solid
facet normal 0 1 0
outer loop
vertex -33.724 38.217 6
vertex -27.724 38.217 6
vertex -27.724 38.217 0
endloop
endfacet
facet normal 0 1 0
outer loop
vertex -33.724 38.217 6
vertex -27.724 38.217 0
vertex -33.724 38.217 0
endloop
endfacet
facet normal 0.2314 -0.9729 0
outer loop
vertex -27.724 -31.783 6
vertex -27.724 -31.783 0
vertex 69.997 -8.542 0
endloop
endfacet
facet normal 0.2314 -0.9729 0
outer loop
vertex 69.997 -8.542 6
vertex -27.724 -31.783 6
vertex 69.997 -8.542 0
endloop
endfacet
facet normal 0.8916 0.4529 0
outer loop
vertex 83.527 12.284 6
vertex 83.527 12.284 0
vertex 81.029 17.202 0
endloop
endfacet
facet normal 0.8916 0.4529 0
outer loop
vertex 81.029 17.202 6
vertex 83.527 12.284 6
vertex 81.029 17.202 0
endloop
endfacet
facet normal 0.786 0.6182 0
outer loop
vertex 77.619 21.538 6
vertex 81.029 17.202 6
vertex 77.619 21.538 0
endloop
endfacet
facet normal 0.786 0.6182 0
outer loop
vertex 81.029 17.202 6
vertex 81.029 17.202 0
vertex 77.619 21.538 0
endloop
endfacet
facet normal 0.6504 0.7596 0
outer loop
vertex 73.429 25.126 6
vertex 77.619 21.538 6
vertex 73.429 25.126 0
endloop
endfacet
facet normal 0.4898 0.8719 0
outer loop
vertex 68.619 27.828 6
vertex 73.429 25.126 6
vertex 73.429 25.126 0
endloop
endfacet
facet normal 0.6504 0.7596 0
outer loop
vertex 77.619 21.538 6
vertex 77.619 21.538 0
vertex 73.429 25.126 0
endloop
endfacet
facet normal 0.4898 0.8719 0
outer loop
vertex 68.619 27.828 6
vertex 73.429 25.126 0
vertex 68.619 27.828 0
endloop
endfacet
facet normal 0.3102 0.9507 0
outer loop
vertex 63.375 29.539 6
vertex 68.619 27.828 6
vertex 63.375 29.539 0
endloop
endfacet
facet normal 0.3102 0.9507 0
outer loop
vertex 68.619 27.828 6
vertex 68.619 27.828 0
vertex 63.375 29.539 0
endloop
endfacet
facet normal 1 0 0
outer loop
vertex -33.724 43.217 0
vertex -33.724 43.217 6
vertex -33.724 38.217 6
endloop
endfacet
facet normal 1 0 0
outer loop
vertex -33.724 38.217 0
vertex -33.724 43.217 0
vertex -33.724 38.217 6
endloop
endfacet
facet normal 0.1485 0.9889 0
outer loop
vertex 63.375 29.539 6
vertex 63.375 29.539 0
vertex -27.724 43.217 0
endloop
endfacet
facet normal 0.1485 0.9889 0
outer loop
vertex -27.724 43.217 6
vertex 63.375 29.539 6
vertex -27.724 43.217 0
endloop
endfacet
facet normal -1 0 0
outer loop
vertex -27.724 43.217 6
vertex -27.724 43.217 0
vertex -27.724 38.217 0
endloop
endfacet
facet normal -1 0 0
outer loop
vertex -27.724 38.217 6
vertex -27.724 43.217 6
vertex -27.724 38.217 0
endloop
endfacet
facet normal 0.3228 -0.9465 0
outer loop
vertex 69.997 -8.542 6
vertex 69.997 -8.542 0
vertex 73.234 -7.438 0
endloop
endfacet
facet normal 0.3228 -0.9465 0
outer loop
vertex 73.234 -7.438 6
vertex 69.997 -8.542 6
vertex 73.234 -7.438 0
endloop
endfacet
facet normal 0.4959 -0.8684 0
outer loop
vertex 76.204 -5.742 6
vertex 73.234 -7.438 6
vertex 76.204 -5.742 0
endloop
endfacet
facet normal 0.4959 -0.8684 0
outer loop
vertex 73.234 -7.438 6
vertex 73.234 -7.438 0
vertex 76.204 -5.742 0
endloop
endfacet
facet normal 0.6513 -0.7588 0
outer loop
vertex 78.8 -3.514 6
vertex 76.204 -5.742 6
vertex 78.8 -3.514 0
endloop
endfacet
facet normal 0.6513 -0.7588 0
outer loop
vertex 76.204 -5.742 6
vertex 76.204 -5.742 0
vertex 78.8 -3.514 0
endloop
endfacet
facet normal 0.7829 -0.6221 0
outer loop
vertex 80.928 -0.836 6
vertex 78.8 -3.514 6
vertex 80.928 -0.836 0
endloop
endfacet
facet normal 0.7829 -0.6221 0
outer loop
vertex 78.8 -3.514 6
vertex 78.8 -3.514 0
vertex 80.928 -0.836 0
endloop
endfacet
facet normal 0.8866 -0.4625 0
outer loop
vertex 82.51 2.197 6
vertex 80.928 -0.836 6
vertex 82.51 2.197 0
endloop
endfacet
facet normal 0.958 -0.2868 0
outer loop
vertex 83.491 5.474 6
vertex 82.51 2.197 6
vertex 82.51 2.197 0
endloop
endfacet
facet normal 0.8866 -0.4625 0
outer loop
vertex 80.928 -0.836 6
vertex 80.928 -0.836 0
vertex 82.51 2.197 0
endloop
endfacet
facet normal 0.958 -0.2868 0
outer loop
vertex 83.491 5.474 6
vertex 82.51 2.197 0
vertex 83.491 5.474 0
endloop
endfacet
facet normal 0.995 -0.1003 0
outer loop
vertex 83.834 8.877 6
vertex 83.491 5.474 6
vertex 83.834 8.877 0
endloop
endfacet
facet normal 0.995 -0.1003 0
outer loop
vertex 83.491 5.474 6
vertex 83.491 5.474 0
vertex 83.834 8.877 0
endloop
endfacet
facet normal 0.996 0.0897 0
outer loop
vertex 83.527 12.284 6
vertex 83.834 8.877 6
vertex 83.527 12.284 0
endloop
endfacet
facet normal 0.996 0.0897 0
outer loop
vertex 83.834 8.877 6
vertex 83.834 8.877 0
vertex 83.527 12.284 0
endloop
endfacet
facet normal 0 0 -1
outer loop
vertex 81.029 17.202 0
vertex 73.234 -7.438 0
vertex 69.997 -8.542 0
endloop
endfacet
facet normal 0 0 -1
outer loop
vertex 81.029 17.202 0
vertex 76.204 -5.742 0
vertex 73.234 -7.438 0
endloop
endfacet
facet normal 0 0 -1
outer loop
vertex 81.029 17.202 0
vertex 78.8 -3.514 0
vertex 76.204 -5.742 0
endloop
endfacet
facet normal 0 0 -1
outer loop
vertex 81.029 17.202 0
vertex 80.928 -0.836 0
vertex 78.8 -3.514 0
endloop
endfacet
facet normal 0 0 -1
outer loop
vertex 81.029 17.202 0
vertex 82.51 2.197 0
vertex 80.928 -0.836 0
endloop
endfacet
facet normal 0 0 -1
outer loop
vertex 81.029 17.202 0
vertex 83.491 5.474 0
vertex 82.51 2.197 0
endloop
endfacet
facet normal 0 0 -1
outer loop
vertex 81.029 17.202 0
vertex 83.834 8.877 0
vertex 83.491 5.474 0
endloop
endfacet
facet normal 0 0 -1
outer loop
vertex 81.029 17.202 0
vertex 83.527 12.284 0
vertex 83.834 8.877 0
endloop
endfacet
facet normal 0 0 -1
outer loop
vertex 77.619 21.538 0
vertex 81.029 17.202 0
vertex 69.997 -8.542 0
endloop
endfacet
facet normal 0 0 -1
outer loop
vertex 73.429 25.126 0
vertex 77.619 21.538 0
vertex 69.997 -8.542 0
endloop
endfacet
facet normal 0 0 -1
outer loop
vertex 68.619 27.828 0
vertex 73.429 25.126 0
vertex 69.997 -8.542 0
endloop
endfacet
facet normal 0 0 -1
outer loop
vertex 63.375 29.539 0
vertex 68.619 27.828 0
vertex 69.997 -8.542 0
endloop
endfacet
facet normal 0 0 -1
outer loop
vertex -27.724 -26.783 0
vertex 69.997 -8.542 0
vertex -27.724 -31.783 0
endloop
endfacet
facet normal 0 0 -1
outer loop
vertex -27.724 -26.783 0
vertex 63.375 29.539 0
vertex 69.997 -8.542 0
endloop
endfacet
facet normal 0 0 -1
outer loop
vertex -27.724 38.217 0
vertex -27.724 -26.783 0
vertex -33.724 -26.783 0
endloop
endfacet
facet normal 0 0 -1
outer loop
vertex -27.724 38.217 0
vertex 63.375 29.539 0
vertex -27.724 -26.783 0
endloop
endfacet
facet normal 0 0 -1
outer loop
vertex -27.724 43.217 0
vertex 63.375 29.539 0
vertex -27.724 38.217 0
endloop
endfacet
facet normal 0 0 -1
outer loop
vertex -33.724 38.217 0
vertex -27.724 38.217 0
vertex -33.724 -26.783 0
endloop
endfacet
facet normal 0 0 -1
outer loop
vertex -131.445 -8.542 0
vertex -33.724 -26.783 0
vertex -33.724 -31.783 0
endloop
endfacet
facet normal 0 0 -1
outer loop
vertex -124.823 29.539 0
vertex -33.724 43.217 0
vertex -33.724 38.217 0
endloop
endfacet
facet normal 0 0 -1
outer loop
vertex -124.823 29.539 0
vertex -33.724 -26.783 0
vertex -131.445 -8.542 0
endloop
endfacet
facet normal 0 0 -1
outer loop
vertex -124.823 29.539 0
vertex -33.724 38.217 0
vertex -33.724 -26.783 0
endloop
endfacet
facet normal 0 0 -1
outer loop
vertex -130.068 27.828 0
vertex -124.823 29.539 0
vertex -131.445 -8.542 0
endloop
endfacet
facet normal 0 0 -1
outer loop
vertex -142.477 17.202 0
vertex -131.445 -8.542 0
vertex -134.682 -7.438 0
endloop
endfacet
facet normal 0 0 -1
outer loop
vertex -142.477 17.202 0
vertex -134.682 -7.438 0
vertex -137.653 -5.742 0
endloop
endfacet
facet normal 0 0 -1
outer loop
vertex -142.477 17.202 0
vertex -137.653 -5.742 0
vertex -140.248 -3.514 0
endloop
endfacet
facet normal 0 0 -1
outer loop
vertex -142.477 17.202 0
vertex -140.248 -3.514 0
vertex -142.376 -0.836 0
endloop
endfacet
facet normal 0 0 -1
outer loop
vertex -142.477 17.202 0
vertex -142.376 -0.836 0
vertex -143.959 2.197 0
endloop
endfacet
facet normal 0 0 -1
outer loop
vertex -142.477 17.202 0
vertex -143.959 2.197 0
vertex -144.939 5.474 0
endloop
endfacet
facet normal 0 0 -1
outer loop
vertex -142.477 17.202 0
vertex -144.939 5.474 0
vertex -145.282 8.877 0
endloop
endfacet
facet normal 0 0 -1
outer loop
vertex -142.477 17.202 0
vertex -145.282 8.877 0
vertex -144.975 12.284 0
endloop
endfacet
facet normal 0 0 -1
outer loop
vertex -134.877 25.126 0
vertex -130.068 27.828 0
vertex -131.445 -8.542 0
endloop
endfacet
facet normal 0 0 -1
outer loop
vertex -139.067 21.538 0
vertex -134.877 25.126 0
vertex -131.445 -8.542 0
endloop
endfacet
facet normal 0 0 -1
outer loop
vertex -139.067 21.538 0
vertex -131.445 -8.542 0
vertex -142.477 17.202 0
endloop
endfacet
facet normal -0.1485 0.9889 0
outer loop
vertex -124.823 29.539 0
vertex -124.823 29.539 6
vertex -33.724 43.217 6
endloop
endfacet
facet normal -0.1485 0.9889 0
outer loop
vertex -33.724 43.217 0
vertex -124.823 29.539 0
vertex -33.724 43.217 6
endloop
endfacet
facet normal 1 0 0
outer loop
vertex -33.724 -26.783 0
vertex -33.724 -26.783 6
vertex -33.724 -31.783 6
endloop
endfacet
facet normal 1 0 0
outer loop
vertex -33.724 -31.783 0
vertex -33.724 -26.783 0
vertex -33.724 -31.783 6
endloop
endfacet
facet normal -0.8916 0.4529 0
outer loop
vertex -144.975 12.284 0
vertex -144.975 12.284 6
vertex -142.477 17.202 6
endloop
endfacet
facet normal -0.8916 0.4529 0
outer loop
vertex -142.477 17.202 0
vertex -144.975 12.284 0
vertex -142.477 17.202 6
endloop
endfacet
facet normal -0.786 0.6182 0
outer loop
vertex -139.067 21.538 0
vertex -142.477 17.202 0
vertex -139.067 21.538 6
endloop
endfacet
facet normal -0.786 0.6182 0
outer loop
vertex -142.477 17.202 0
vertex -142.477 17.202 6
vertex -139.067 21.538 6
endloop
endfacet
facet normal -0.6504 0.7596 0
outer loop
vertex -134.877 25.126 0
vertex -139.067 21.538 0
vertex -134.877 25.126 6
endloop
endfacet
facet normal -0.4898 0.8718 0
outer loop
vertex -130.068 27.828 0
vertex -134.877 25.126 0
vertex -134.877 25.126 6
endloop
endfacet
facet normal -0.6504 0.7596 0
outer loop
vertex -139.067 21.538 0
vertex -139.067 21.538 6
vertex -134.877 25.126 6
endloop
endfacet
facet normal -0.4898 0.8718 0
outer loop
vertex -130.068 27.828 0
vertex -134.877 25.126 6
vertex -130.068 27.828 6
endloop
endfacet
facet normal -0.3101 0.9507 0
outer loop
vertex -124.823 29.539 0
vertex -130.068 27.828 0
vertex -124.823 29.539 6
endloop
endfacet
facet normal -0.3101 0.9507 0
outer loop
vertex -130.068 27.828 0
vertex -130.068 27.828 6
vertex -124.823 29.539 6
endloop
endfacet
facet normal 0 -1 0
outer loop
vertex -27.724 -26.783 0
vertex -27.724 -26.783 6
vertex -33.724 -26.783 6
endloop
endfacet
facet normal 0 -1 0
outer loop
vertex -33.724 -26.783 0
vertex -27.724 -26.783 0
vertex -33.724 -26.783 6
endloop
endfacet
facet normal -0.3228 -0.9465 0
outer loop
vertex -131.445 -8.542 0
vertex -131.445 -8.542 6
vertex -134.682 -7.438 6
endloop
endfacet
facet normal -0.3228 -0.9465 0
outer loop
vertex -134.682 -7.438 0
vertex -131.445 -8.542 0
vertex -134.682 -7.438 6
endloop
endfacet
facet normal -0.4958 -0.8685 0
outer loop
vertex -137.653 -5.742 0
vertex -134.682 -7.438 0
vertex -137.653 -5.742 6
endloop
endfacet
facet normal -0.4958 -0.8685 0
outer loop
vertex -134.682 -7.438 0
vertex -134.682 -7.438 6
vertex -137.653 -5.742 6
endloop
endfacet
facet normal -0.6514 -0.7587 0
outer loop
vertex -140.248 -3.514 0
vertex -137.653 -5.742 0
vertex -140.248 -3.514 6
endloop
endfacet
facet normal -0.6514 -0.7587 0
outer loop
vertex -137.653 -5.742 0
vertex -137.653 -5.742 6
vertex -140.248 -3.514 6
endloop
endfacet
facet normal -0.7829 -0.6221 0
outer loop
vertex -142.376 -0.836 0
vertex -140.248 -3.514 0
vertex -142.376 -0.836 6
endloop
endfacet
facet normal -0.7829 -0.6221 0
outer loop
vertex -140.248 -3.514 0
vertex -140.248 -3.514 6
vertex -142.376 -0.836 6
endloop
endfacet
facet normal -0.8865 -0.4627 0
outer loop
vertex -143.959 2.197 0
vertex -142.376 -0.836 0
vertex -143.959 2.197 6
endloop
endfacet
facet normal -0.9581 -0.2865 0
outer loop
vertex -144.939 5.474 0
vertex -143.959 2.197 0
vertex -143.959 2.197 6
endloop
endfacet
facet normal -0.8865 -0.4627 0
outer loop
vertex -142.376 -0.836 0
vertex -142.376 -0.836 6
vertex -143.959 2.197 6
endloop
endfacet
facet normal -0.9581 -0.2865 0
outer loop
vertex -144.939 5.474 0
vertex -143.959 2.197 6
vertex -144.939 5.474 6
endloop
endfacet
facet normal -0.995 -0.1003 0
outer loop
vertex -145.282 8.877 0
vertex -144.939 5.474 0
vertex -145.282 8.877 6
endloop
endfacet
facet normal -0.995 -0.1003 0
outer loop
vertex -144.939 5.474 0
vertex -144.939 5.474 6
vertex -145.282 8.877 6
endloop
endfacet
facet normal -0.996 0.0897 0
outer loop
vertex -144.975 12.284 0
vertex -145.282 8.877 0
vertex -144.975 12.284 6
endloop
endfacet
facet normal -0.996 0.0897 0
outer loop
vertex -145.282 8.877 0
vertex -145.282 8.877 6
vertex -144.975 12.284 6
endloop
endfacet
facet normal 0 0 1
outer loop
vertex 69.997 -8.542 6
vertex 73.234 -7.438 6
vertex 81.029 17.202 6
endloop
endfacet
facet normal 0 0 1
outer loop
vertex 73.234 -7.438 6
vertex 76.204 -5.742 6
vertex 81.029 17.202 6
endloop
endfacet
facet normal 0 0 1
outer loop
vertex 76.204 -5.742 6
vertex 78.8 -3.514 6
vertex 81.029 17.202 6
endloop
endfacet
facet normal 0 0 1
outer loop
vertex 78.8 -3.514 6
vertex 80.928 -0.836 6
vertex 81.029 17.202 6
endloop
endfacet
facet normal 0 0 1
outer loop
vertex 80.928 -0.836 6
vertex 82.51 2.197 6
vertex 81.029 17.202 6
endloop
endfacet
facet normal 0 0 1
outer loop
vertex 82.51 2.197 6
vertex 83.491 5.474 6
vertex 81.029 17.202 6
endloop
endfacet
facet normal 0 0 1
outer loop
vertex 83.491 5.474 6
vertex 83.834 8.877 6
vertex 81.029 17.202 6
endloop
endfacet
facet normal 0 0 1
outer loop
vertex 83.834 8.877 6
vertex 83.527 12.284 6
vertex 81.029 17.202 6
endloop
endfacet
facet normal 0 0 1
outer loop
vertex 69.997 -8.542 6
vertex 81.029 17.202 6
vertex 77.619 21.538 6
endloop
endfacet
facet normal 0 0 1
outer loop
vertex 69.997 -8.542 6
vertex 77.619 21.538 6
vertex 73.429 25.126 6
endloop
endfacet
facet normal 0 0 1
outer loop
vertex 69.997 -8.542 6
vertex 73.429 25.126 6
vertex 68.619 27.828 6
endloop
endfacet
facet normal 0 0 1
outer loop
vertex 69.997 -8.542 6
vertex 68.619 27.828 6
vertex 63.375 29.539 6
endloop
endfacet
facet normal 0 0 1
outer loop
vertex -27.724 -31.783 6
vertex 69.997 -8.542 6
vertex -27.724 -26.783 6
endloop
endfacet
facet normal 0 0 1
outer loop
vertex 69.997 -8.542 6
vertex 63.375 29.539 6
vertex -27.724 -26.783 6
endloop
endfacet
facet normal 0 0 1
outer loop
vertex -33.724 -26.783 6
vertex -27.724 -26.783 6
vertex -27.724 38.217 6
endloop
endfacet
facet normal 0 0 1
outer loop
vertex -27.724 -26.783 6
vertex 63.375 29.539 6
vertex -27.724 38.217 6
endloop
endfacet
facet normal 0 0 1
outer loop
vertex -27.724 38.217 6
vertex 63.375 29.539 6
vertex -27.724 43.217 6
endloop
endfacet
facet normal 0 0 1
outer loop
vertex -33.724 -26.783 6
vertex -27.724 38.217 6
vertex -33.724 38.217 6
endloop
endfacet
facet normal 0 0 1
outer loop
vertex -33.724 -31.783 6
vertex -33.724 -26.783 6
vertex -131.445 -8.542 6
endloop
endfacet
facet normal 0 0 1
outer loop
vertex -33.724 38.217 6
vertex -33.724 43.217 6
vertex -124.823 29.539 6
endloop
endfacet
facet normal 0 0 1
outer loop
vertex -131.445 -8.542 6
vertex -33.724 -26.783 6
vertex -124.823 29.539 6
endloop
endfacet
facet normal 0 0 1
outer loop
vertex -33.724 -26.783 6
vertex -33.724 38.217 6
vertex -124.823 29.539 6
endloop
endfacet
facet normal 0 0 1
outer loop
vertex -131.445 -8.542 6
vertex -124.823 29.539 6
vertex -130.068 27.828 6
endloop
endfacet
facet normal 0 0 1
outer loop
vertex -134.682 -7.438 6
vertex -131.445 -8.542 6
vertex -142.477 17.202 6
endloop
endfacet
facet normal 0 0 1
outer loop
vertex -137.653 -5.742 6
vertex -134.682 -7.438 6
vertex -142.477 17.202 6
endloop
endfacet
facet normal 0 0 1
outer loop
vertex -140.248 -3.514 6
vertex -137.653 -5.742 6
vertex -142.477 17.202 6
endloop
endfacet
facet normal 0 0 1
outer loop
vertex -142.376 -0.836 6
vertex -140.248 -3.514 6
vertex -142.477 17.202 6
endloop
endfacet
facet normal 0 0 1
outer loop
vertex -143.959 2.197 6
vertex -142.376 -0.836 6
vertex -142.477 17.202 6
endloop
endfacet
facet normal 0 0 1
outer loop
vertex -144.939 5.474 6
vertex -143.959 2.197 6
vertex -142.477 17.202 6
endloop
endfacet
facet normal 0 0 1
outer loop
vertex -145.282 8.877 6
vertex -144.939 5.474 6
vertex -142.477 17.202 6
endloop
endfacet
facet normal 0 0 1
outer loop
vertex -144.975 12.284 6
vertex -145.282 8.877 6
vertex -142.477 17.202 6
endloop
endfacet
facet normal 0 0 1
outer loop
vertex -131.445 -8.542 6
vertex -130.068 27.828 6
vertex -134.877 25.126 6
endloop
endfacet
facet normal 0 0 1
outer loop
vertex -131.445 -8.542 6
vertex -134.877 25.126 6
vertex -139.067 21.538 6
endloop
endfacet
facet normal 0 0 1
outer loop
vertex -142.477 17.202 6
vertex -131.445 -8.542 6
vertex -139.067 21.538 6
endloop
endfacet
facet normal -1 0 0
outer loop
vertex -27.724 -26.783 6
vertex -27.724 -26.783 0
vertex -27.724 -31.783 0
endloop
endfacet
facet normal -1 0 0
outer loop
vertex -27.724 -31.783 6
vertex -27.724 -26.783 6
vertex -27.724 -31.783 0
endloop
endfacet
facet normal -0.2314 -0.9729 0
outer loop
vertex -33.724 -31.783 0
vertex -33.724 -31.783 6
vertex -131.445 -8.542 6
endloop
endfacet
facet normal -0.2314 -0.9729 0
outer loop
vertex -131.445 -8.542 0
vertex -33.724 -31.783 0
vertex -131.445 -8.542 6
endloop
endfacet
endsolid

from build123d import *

# Parameters (mm, degrees)
F0_W     = 3
F0_H     = 65
F1_DEPTH = 6
F3_COUNT = 2
F3_ANGLE = 180


with BuildPart() as f1:
    # F0 (on Top) → F1 (new body)
    with BuildSketch(Plane.XY):
        with BuildLine():
            Line((-27.724255, -31.782916), (69.996519, -8.541981))
            ThreePointArc((69.996519, -8.541981), (80.927579, -0.835803), (83.526947, 12.283517))
            ThreePointArc((83.526947, 12.283517), (75.611861, 23.435124), (63.374858, 29.53944))
            Line((63.374858, 29.53944), (-27.724255, 43.217084))
            Line((-27.724255, 43.217084), (-27.724255, 38.217084))
            Line((-27.724255, 38.217084), (-27.724255, -26.782916))
            Line((-27.724255, -26.782916), (-27.724255, -31.782916))
        make_face()
        with Locations((-29.224255, 5.717084)):
            Rectangle(F0_W, F0_H)
    extrude(amount=F1_DEPTH)

    # F3: F1 ×2 about axis
    f3_axis = Axis((-30.724255, 5.717084, 3), (0, -1, 0))


with BuildPart() as f1_1:
    add(f1.part)
    for i in range(1, F3_COUNT):
        add(f1.part.rotate(f3_axis, i * F3_ANGLE / (F3_COUNT - 1)))


solid = f1_1.part
